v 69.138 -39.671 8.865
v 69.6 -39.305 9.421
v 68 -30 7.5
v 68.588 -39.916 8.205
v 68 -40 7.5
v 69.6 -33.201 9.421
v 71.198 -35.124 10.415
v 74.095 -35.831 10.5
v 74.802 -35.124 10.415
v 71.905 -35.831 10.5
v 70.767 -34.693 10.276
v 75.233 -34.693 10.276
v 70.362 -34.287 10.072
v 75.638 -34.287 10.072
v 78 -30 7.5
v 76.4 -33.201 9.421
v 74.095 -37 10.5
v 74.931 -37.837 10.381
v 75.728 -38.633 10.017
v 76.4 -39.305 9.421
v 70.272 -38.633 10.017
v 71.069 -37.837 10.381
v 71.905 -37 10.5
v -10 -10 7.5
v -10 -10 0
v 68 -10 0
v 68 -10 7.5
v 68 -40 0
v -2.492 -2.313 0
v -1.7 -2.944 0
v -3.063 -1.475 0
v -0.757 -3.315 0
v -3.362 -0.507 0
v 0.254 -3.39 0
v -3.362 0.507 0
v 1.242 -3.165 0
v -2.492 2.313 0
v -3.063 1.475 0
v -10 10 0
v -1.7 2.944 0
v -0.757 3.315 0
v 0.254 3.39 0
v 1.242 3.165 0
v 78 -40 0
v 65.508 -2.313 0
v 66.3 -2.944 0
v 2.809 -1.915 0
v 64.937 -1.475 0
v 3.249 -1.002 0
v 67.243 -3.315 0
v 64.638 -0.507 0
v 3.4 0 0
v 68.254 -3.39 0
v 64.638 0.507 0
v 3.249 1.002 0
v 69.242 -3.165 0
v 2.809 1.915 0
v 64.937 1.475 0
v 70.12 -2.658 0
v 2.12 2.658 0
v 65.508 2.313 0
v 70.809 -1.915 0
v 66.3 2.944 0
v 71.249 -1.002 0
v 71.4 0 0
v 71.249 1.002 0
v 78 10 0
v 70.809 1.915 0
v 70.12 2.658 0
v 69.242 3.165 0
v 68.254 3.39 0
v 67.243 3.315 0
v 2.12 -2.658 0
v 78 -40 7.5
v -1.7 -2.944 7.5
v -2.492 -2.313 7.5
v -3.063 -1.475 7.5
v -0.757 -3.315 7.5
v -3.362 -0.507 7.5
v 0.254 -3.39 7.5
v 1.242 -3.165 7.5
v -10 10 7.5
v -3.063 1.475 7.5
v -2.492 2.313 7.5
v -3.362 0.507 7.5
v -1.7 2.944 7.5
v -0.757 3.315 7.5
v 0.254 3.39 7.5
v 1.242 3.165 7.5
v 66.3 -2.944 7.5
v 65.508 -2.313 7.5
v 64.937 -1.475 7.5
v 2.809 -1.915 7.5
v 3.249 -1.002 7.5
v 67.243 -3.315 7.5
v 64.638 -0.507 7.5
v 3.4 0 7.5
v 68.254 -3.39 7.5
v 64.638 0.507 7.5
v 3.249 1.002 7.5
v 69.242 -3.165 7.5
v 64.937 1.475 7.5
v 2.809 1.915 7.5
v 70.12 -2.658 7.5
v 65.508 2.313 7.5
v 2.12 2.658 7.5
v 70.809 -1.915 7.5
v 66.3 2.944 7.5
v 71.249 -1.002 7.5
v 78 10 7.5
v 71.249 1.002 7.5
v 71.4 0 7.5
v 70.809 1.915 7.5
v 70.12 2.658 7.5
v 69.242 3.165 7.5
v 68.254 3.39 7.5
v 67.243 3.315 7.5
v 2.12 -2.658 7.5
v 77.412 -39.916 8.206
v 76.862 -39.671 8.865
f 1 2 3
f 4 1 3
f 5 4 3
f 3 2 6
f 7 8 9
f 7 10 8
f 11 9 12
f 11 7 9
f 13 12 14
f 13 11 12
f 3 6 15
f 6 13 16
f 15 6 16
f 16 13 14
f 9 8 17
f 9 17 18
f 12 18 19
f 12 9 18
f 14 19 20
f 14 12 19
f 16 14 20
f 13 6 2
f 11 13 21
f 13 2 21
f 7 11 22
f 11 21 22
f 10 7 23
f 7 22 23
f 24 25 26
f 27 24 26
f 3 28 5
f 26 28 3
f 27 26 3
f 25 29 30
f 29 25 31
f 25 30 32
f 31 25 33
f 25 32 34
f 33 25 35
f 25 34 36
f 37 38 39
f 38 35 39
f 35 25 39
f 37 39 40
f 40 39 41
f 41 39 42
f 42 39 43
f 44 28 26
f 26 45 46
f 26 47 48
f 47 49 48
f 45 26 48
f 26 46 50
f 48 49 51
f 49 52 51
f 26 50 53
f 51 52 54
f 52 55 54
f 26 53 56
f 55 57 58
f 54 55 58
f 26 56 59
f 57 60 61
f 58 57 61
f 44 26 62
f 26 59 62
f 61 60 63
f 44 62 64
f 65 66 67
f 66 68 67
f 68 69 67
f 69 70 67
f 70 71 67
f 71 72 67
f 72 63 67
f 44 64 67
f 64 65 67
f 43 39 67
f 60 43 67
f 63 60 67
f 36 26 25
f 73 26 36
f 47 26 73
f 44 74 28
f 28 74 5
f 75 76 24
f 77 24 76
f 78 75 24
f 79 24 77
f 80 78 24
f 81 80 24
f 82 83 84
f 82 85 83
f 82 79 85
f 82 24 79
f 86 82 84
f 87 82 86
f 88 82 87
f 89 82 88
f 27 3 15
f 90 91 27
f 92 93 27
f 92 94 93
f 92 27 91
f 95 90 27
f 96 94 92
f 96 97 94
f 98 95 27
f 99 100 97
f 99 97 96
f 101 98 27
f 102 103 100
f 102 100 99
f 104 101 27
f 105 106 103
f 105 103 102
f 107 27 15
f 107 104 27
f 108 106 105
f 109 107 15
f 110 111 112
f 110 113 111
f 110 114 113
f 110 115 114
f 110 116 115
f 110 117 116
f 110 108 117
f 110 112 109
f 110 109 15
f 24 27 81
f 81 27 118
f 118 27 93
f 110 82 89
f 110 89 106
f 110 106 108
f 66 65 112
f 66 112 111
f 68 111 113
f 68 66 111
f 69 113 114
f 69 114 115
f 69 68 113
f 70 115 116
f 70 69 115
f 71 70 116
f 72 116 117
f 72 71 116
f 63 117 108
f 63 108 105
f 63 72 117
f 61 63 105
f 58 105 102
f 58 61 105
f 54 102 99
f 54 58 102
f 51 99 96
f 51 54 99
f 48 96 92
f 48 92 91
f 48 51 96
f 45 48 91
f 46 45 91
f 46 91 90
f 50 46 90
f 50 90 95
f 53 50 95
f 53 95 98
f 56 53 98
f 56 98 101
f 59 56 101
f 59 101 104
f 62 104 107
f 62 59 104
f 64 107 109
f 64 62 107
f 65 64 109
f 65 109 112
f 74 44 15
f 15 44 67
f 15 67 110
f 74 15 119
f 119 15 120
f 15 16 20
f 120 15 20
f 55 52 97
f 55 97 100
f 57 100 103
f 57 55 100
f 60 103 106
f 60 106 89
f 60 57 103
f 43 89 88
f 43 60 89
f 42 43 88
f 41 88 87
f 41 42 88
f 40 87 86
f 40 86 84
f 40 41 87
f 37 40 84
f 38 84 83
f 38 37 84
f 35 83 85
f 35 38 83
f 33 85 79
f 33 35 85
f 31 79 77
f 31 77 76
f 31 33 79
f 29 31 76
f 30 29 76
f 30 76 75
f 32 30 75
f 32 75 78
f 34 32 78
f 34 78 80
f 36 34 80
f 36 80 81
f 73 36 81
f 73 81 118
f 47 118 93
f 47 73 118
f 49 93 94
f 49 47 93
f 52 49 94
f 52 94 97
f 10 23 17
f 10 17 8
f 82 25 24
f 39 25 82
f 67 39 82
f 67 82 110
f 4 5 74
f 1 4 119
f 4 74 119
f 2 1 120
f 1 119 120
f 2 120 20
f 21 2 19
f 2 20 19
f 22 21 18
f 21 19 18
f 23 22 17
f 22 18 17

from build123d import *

# Parameters (mm, degrees)
SKETCH1_W           = 88
SKETCH1_H           = 20
SKETCH1_R           = 3.4
BOSS_EXTRUDE1_DEPTH = 7.5
SKETCH2_W           = 10
SKETCH2_H           = 7.5
BOSS_EXTRUDE2_DEPTH = 30
FILLET1_R           = 3


with BuildPart() as part:
    # Sketch1 → Boss-Extrude1 (new body)
    with BuildSketch(Plane.XY):
        with Locations((34, 0)):
            Rectangle(SKETCH1_W, SKETCH1_H)
        Circle(SKETCH1_R, mode=Mode.SUBTRACT)
        with Locations((68, 0)):
            Circle(SKETCH1_R, mode=Mode.SUBTRACT)
    extrude(amount=BOSS_EXTRUDE1_DEPTH)

    # Sketch2 → Boss-Extrude2 (add)
    with BuildSketch(Plane.XZ.offset(10)):
        with Locations((73, 3.75)):
            Rectangle(SKETCH2_W, SKETCH2_H)
    extrude(amount=BOSS_EXTRUDE2_DEPTH)

    # Sketch4 → Loft1 section 0
    with BuildSketch(Plane.XY.offset(7.5)):
        with BuildLine():
            Line((78, -40), (68, -40))
            Line((68, -40), (68, -30))
            Line((68, -30), (78, -30))
            Line((78, -30), (78, -40))
        make_face()
    # Sketch3 → Loft1 section 1
    with BuildSketch(Plane.XY.offset(10.5)):
        with BuildLine():
            Line((75.5, -35), (70.5, -35))
            Line((70.5, -35), (70.5, -40))
            Line((70.5, -40), (75.5, -40))
            Line((75.5, -40), (75.5, -35))
        make_face()
    loft()

    # Fillet1
    fillet1_edges = [part.edges().sort_by_distance(p)[0] for p in [
        (73, -35, 10.5),
        (75.5, -37.5, 10.5),
        (73, -40, 10.5),
        (70.5, -37.5, 10.5),
    ]]
    fillet(fillet1_edges, radius=FILLET1_R - 0.0001)  # a hair under: the kernel refuses the full size


solid = part.part
